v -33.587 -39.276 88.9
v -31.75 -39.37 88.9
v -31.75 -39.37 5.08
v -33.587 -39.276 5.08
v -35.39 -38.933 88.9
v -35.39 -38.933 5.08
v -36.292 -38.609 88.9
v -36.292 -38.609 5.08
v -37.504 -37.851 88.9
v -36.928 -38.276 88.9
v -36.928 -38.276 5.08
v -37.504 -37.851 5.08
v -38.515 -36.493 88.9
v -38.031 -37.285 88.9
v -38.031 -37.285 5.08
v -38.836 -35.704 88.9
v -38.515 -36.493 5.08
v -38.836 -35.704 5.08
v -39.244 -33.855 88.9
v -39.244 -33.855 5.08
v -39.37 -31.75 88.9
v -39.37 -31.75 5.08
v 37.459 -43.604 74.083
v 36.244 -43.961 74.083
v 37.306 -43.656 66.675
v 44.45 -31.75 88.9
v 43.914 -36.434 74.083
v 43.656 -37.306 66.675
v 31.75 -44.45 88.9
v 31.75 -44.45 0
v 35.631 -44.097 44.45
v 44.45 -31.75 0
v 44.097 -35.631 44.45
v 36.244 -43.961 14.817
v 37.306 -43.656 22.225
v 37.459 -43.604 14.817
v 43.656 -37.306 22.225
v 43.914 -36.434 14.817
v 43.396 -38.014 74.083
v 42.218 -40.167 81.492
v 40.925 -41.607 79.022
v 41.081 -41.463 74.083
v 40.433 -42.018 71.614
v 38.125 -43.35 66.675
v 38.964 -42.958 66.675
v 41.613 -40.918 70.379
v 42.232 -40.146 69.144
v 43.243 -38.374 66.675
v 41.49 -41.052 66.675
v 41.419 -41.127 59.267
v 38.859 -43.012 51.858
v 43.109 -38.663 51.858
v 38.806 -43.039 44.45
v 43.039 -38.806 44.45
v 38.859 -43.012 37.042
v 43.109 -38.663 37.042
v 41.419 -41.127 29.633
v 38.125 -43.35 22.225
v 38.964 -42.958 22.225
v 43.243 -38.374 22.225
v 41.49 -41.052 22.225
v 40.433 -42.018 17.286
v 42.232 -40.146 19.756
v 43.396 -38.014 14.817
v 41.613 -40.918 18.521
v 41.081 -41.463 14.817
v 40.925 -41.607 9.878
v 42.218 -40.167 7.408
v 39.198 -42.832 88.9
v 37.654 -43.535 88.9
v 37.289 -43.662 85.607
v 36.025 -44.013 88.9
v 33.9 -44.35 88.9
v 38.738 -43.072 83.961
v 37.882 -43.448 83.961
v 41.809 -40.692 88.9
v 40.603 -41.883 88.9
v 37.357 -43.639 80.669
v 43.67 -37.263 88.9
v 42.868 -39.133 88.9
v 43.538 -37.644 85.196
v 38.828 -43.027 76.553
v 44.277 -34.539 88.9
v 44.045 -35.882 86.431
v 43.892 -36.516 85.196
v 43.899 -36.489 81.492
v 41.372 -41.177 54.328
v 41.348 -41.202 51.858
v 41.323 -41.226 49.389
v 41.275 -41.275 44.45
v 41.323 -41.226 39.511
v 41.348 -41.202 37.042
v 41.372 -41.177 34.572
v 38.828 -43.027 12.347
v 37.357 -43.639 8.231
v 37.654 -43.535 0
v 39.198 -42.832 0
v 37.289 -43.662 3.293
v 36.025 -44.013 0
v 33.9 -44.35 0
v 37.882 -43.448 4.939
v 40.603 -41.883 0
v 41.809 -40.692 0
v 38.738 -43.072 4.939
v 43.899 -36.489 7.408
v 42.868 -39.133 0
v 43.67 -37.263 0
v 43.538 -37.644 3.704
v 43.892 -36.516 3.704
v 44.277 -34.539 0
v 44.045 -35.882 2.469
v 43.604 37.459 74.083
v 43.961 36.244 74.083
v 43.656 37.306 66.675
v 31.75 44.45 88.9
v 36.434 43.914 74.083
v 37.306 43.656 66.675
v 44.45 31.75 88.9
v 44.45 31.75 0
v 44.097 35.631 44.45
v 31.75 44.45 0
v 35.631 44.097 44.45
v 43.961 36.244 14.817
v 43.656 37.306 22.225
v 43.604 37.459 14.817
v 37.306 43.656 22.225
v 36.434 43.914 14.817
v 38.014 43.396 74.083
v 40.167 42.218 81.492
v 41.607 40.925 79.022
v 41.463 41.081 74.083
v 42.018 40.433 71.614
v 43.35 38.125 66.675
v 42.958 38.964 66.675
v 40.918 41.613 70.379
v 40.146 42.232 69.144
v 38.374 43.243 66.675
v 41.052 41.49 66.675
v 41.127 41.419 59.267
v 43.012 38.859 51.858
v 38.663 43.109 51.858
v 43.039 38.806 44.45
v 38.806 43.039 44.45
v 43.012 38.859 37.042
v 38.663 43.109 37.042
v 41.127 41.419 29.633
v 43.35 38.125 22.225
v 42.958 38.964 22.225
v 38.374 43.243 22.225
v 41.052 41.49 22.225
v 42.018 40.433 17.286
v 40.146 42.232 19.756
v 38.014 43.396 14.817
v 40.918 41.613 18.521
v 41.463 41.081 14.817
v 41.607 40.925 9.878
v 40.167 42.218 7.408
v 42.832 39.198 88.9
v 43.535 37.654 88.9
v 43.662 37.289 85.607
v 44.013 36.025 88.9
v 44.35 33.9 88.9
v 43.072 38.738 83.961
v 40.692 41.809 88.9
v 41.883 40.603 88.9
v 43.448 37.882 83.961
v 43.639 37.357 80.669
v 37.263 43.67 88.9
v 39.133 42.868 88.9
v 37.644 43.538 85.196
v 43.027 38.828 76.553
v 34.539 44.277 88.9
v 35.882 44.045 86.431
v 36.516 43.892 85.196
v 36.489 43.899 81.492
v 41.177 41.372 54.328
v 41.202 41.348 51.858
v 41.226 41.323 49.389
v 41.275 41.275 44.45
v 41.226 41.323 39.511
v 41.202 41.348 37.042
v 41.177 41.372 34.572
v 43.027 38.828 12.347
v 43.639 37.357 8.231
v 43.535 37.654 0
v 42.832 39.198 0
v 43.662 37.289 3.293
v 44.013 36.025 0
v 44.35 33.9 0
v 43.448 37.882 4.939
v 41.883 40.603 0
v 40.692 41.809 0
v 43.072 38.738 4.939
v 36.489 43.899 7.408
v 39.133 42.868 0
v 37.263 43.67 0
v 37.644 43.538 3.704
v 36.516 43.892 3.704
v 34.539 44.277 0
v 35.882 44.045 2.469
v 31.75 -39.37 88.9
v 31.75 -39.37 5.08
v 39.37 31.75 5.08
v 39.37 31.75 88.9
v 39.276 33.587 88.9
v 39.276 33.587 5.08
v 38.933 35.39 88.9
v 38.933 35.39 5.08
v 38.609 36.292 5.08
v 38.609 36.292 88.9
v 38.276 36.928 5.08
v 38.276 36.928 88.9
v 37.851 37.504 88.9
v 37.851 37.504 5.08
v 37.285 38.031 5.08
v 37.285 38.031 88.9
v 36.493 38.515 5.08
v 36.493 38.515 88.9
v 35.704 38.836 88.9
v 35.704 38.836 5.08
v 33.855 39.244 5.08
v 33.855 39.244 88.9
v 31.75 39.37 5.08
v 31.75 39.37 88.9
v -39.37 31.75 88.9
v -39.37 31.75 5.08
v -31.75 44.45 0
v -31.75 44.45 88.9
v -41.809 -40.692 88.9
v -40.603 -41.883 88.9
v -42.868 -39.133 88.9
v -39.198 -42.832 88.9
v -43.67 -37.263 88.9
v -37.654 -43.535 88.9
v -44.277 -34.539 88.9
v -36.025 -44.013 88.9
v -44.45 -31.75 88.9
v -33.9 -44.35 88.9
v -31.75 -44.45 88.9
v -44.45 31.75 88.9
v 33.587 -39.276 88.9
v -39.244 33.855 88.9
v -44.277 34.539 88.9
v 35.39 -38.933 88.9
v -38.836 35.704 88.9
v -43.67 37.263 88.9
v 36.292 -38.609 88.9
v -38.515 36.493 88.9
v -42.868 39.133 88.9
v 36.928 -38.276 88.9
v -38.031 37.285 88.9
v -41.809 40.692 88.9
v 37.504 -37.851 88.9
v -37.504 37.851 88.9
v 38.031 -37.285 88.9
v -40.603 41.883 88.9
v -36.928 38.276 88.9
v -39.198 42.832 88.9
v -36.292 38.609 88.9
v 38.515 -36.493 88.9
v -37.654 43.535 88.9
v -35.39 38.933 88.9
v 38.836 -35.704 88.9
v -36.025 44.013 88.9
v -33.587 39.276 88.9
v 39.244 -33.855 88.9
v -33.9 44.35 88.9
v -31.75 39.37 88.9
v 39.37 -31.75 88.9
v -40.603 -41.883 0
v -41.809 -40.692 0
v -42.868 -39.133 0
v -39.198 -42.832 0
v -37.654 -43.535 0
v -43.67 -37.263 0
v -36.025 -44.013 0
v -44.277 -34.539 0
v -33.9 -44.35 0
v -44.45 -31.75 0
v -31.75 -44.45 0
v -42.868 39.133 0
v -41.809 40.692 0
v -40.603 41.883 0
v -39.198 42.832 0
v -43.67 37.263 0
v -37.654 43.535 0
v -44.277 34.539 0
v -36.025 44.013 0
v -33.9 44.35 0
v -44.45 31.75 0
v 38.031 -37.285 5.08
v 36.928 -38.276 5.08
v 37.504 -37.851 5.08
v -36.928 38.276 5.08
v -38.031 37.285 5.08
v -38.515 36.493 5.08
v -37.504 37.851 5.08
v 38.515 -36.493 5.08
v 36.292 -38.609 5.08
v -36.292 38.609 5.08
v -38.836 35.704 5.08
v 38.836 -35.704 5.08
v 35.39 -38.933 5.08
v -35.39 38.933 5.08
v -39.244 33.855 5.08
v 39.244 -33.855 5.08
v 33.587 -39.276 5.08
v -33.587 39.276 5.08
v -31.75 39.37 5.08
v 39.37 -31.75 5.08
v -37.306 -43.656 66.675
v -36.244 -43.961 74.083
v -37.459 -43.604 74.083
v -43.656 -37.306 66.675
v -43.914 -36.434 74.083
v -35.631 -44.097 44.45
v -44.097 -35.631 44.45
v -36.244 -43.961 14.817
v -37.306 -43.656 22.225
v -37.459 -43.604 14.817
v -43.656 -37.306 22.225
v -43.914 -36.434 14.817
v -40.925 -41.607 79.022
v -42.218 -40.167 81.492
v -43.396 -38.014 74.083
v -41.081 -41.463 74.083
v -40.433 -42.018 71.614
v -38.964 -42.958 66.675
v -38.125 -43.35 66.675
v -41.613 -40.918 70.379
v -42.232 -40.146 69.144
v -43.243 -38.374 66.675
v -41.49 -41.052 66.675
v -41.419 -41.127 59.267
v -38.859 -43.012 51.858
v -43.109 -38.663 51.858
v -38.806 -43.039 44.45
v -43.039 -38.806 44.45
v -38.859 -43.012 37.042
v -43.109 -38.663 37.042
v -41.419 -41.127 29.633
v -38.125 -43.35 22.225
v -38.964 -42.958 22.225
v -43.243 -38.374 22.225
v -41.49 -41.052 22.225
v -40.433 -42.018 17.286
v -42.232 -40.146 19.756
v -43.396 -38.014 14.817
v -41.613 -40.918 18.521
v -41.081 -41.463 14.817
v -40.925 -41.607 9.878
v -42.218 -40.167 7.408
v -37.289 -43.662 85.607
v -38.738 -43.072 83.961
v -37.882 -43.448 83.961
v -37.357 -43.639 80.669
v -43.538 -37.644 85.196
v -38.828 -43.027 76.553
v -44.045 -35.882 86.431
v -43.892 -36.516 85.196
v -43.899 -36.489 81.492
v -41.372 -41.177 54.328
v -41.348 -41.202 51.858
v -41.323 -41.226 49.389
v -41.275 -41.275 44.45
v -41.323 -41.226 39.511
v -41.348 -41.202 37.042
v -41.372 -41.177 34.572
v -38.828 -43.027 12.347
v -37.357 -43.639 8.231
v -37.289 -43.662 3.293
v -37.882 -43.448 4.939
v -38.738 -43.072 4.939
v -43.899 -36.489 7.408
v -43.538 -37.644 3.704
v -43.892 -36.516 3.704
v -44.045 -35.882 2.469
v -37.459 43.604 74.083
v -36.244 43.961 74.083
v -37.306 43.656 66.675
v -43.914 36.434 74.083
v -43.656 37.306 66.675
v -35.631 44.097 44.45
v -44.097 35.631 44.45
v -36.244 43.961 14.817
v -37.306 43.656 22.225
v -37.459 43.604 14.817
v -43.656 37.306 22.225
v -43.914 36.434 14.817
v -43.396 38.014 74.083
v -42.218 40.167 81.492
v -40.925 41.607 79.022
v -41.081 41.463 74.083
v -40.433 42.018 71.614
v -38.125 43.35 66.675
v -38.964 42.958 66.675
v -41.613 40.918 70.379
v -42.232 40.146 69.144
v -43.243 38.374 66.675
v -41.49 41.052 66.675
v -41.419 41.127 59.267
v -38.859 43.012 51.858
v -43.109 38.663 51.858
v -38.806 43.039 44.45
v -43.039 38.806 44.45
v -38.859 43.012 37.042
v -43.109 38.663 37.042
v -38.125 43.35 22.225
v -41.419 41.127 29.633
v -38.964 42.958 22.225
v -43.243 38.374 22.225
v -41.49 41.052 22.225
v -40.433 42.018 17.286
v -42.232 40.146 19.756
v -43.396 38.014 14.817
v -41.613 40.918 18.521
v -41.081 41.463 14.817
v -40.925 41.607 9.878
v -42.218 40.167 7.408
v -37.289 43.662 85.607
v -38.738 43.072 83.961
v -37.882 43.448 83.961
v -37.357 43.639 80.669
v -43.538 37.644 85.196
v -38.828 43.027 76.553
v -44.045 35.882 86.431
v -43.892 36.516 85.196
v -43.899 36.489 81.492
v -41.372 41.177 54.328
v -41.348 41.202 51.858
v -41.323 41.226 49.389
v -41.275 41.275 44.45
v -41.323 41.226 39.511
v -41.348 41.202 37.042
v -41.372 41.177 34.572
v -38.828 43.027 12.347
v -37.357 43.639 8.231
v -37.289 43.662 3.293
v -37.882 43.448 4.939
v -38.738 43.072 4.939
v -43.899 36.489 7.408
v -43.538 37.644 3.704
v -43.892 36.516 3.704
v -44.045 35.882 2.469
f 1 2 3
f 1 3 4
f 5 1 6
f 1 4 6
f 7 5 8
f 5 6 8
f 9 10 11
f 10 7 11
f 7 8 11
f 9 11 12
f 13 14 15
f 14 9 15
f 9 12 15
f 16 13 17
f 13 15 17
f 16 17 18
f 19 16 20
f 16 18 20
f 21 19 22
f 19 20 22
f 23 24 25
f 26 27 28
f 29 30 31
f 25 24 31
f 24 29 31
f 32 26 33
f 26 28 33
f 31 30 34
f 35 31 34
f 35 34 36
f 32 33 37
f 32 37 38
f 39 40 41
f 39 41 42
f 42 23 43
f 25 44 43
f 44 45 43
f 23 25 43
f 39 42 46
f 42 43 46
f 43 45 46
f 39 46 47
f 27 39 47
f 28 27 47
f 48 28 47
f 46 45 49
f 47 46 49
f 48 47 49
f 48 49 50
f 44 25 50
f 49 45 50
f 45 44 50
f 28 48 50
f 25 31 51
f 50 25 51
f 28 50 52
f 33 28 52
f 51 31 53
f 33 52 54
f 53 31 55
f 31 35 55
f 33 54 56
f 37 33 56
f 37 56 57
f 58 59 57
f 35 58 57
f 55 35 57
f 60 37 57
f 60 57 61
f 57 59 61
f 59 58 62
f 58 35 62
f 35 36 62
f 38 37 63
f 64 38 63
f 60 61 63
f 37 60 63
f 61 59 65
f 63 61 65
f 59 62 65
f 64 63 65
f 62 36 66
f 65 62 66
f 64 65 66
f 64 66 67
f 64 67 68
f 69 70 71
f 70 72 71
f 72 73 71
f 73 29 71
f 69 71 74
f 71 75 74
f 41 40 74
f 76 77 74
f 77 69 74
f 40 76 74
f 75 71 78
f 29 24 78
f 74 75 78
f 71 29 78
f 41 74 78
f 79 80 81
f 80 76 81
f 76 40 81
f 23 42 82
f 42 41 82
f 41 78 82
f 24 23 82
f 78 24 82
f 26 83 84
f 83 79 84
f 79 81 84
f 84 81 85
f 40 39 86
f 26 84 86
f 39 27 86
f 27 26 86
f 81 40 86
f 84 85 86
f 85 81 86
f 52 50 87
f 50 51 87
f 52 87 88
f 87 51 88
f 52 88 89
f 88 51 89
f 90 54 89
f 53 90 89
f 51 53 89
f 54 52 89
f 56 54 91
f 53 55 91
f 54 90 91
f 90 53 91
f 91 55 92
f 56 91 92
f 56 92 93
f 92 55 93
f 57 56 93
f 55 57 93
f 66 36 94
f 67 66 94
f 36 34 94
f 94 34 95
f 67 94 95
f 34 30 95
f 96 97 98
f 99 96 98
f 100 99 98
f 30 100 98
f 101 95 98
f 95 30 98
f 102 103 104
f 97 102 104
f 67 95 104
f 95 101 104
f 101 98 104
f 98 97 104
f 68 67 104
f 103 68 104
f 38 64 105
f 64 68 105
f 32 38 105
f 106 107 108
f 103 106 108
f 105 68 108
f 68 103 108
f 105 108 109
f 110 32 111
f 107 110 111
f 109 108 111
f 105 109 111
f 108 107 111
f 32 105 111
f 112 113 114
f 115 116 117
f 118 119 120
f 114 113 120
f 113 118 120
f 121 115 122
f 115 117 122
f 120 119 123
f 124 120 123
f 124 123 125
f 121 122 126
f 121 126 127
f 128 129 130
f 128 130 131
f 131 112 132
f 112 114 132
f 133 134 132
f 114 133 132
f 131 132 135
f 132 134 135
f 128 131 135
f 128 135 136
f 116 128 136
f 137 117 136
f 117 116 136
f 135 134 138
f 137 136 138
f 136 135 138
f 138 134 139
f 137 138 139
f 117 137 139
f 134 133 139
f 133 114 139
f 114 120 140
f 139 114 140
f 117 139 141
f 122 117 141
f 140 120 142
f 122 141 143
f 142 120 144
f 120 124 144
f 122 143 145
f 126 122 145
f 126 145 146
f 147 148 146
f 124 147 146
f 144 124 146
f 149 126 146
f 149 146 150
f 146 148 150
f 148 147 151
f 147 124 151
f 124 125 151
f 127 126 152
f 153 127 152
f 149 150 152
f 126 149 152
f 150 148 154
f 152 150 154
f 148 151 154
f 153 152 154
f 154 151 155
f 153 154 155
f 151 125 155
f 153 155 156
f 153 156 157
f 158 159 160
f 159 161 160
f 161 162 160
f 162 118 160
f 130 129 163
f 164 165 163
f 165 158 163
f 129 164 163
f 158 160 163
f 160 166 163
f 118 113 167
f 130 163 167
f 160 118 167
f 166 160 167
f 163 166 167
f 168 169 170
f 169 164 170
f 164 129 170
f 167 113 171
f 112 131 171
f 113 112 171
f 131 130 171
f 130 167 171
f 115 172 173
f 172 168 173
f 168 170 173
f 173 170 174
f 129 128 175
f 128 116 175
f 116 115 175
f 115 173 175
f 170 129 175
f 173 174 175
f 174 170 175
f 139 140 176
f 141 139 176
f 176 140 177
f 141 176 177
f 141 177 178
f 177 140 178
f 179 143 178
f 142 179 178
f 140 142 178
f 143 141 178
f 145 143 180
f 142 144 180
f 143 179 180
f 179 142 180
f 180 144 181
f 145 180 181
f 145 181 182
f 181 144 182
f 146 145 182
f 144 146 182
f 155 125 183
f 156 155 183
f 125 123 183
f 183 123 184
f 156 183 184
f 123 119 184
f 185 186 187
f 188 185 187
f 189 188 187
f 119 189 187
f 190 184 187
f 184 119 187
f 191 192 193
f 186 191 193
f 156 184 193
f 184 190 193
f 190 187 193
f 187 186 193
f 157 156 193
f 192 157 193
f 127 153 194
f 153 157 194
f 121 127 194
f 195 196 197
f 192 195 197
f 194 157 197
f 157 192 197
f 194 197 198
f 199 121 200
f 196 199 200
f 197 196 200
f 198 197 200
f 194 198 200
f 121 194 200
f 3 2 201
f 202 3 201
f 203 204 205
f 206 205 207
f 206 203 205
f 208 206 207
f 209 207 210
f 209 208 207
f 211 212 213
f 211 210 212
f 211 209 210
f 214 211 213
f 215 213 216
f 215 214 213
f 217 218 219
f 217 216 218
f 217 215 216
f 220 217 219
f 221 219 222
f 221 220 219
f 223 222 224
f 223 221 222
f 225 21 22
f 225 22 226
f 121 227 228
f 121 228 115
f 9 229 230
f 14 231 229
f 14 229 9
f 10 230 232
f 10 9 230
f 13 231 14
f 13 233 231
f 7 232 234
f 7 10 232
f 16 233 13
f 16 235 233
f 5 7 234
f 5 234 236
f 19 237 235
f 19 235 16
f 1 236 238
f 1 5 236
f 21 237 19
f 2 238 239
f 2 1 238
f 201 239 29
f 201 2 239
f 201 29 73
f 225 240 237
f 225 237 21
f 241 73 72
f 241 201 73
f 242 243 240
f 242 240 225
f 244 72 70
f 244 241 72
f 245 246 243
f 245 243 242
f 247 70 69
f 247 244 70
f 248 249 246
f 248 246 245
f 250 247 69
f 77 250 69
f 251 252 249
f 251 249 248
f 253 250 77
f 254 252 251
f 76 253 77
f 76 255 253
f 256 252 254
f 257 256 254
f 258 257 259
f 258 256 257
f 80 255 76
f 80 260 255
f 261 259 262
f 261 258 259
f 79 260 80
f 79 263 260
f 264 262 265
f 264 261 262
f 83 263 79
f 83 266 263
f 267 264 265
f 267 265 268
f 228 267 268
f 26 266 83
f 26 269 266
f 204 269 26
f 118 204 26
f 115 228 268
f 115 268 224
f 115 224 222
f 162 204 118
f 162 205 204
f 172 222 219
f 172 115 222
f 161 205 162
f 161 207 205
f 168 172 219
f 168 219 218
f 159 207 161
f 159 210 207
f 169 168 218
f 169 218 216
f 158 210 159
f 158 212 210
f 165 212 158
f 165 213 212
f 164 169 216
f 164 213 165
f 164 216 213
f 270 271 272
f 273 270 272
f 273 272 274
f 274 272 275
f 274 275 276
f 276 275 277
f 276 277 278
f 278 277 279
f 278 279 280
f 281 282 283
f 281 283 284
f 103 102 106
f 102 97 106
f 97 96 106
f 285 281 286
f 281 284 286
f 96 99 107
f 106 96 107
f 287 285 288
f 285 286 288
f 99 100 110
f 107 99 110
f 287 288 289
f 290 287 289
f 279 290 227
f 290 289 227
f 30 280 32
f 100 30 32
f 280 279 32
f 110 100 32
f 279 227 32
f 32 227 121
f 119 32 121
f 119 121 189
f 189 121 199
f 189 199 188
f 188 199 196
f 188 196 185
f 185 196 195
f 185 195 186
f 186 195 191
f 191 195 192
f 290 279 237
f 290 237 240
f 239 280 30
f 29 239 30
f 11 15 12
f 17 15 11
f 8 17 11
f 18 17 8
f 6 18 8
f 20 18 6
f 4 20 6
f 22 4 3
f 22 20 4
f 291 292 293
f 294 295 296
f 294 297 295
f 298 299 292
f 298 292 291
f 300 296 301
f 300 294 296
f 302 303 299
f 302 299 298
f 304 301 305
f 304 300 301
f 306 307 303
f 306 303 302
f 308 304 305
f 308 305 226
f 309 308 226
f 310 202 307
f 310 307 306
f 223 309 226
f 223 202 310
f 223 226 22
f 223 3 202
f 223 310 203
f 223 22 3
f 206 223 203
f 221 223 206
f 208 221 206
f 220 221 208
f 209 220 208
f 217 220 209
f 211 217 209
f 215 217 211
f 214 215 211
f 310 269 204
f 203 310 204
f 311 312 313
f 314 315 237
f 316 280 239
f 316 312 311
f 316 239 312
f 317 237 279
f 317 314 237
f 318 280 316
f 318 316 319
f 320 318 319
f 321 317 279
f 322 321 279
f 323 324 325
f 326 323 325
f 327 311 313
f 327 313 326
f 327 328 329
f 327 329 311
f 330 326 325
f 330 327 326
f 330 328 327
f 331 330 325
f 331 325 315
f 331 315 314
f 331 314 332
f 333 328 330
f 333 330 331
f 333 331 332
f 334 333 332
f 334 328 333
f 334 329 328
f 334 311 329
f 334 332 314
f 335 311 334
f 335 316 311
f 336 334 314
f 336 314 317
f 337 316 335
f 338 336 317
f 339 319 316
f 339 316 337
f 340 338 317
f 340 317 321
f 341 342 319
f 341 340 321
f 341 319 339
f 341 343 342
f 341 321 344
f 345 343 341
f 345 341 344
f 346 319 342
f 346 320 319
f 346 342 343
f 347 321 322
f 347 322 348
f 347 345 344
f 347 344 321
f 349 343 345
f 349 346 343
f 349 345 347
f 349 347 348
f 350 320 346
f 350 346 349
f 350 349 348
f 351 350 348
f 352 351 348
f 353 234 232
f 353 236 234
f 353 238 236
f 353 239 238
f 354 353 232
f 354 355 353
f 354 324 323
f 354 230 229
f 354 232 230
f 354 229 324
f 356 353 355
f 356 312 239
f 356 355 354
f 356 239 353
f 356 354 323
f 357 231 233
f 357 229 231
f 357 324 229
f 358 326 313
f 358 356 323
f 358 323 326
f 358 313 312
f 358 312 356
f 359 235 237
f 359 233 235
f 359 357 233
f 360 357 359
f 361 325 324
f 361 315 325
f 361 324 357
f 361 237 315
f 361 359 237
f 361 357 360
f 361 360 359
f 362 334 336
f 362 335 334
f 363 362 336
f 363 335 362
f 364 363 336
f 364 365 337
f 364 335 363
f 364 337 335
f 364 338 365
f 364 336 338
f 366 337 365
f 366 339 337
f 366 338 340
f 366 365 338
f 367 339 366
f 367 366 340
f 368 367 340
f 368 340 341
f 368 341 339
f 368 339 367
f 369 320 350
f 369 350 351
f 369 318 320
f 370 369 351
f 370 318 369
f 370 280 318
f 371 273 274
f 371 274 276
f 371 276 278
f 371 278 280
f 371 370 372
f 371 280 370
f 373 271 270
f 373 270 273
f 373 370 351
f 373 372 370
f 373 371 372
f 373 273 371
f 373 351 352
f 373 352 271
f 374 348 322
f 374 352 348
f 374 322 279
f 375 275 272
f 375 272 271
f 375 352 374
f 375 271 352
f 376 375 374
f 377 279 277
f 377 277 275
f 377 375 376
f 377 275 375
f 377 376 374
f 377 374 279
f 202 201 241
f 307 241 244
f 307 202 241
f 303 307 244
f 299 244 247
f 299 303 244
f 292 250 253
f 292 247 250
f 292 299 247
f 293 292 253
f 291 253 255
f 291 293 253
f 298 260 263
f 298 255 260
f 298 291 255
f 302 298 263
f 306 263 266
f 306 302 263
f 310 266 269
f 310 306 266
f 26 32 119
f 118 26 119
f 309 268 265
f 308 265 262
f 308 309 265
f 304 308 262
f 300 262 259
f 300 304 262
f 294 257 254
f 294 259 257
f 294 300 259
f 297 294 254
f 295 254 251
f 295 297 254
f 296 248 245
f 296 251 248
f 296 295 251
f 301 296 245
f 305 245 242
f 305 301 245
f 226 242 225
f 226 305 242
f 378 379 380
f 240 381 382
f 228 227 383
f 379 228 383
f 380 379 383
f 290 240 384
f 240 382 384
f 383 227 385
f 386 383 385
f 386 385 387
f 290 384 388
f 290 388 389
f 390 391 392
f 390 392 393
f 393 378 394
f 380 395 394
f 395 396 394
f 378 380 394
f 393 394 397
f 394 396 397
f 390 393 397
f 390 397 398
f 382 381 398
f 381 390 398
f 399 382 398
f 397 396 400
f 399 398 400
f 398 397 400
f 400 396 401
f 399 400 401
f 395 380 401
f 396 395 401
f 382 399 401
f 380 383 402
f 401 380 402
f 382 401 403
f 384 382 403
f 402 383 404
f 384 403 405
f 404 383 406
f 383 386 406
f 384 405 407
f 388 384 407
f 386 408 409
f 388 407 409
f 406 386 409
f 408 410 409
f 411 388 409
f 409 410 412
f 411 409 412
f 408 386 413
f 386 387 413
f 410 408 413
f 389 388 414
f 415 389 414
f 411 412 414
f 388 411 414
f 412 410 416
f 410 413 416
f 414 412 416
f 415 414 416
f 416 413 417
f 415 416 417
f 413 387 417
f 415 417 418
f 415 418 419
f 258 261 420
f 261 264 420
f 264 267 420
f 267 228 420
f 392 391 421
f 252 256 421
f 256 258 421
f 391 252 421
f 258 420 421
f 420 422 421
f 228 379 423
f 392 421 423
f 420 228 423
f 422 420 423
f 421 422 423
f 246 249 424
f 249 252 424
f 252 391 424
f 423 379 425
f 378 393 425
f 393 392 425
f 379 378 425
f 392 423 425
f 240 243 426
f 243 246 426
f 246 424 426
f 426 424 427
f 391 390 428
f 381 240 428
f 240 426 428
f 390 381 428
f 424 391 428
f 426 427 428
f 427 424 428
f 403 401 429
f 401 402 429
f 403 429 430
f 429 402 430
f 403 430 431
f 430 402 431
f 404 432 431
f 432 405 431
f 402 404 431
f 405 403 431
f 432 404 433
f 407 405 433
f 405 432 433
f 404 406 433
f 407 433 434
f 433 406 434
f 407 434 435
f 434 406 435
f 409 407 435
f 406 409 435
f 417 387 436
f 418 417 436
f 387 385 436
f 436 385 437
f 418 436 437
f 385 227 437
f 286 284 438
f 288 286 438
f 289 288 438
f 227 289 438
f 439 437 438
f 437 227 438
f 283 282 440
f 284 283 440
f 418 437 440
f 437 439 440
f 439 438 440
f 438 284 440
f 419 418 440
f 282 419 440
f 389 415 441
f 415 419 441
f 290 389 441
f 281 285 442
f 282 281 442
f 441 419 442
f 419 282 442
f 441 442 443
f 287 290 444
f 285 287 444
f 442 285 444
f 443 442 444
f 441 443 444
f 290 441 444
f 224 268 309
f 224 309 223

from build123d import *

# Parameters (mm, degrees)
F0_W        = 88.9
F0_H        = 88.9
F1_DEPTH    = 88.9
F2_T1_DEPTH = 152.4
F3_T        = -5.08


# Not quite as in the source:
# - a fillet or chamfer that OpenCascade refuses, or shapes differently, is made with other operations: its cross-section is extruded or revolved along the edge and cut away or added


with BuildPart() as f1:
    # F0 (on Top) → F1 (new body)
    with BuildSketch(Plane.XY):
        Rectangle(F0_W, F0_H)
    extrude(amount=F1_DEPTH)

    # F2: fillet of radius 12.7 on 4 edges, made by hand

    # F2_s2 → F2_t1 (cut)
    with BuildSketch(Plane.XY.offset(-31.75)):
        with BuildLine():
            add(Edge.make_bspline(
                [(31.75, -44.45), (44.45, -44.45), (44.45, -31.75)],
                knots=[0, 0, 0, 1, 1, 1], degree=2, weights=[1, 1, 1]))
            Line((44.45, -31.75), (44.45, -44.45))
            Line((44.45, -44.45), (31.75, -44.45))
        make_face()
        with BuildLine():
            add(Edge.make_bspline(
                [(44.45, 31.75), (44.45, 44.45), (31.75, 44.45)],
                knots=[0, 0, 0, 1, 1, 1], degree=2, weights=[1, 1, 1]))
            Line((31.75, 44.45), (44.45, 44.45))
            Line((44.45, 44.45), (44.45, 31.75))
        make_face()
        with BuildLine():
            add(Edge.make_bspline(
                [(-31.75, -44.45), (-44.45, -44.45), (-44.45, -31.75)],
                knots=[0, 0, 0, 1, 1, 1], degree=2, weights=[1, 1, 1]))
            Line((-44.45, -31.75), (-44.45, -44.45))
            Line((-44.45, -44.45), (-31.75, -44.45))
        make_face()
        with BuildLine():
            add(Edge.make_bspline(
                [(-31.75, 44.45), (-44.45, 44.45), (-44.45, 31.75)],
                knots=[0, 0, 0, 1, 1, 1], degree=2, weights=[1, 1, 1]))
            Line((-44.45, 31.75), (-44.45, 44.45))
            Line((-44.45, 44.45), (-31.75, 44.45))
        make_face()
    extrude(amount=F2_T1_DEPTH, mode=Mode.SUBTRACT)

    # F3
    f3_openings = [f1.faces().sort_by_distance(p)[0] for p in [
        (0, 0, 88.9),
    ]]
    offset(amount=F3_T, openings=f3_openings, kind=Kind.INTERSECTION)


solid = f1.part
